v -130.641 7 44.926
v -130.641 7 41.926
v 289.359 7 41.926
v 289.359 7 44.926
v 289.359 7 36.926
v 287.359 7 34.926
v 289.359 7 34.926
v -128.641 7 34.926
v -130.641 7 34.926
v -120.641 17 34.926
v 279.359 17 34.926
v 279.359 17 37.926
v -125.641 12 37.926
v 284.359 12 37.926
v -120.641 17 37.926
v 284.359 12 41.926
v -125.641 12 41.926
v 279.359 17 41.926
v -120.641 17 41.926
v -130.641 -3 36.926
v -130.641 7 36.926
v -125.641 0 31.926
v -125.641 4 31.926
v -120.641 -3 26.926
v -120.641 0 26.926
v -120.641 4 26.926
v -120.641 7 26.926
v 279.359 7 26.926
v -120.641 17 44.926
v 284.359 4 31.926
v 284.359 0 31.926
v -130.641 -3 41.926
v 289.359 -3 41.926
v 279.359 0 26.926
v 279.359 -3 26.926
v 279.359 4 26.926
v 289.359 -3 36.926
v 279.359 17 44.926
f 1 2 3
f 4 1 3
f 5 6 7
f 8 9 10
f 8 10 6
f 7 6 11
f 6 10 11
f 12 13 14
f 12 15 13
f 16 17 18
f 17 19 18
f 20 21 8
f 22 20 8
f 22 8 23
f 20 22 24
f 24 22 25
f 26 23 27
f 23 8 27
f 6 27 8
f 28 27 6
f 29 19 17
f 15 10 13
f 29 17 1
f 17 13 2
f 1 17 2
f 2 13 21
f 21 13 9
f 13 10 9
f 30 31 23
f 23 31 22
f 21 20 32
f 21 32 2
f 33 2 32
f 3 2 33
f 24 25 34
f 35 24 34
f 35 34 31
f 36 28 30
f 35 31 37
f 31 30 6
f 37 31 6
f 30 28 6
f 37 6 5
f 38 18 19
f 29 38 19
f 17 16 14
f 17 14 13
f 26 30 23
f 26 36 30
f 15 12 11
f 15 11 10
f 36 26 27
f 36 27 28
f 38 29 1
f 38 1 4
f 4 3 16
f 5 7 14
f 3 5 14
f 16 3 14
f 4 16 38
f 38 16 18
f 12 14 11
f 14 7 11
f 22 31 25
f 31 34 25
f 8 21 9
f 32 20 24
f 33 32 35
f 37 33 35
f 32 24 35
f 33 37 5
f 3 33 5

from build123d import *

# Parameters (mm, degrees)
EXTRUDE_2_DEPTH = 4
EXTRUDE_3_DEPTH = 3
SKETCH_5_W      = 420
SKETCH_5_H      = 10
EXTRUDE_4_DEPTH = 5
EXTRUDE_5_DEPTH = 4
EXTRUDE_6_DEPTH = 3


with BuildPart() as part:
    # 草图2 → 凸台-拉伸2 (new body)
    with BuildSketch(Plane(origin=(0, 0, 0), x_dir=(1, 0, 0), z_dir=(0, 1, 0))):
        Polygon((-130.641446974, -36.925945051), (289.358553026, -36.925945051), (284.358553026, -31.925945051), (-125.641446974, -31.925945051), align=None)
    extrude(amount=EXTRUDE_2_DEPTH)

    # 草图3 → 凸台-拉伸3 (add)
    with BuildSketch(Plane(origin=(0, 4, 0), x_dir=(1, 0, 0), z_dir=(0, 1, 0))):
        Polygon((-130.641446974, -36.925945051), (-120.641446974, -26.925945051), (279.358553026, -26.925945051), (289.358553026, -36.925945051), align=None)
    extrude_3 = extrude(amount=EXTRUDE_3_DEPTH)

    # 镜向1: 凸台-拉伸3 across plane
    add(extrude_3.mirror(Plane.ZX.offset(2)))

    # 草图5 → 凸台-拉伸4 (add)
    with BuildSketch(Plane.XY.offset(36.925945051)):
        with Locations((79.358553026, 2)):
            Rectangle(SKETCH_5_W, SKETCH_5_H)
    extrude(amount=EXTRUDE_4_DEPTH)

    # 草图7 → 凸台-拉伸5 (add)
    with BuildSketch(Plane.XY.offset(41.925945051)):
        Polygon((-130.641446974, 7), (289.358553026, 7), (284.358553026, 12), (-125.641446974, 12), align=None)
    extrude(amount=-EXTRUDE_5_DEPTH)

    # 草图8 → 凸台-拉伸6 (add)
    with BuildSketch(Plane(origin=(0, 0, 37.925945051), x_dir=(-1, 0, 0), z_dir=(0, 0, -1))):
        Polygon((-289.358553026, 7), (-279.358553026, 17), (120.641446974, 17), (130.641446974, 7), align=None)
    extrude_6 = extrude(amount=EXTRUDE_6_DEPTH)

    # 镜向2: 凸台-拉伸6 across plane
    add(extrude_6.mirror(Plane(origin=(0, 0, 39.925945051), x_dir=(1, 0, 0), z_dir=(0, 0, -1))))


solid = part.part
